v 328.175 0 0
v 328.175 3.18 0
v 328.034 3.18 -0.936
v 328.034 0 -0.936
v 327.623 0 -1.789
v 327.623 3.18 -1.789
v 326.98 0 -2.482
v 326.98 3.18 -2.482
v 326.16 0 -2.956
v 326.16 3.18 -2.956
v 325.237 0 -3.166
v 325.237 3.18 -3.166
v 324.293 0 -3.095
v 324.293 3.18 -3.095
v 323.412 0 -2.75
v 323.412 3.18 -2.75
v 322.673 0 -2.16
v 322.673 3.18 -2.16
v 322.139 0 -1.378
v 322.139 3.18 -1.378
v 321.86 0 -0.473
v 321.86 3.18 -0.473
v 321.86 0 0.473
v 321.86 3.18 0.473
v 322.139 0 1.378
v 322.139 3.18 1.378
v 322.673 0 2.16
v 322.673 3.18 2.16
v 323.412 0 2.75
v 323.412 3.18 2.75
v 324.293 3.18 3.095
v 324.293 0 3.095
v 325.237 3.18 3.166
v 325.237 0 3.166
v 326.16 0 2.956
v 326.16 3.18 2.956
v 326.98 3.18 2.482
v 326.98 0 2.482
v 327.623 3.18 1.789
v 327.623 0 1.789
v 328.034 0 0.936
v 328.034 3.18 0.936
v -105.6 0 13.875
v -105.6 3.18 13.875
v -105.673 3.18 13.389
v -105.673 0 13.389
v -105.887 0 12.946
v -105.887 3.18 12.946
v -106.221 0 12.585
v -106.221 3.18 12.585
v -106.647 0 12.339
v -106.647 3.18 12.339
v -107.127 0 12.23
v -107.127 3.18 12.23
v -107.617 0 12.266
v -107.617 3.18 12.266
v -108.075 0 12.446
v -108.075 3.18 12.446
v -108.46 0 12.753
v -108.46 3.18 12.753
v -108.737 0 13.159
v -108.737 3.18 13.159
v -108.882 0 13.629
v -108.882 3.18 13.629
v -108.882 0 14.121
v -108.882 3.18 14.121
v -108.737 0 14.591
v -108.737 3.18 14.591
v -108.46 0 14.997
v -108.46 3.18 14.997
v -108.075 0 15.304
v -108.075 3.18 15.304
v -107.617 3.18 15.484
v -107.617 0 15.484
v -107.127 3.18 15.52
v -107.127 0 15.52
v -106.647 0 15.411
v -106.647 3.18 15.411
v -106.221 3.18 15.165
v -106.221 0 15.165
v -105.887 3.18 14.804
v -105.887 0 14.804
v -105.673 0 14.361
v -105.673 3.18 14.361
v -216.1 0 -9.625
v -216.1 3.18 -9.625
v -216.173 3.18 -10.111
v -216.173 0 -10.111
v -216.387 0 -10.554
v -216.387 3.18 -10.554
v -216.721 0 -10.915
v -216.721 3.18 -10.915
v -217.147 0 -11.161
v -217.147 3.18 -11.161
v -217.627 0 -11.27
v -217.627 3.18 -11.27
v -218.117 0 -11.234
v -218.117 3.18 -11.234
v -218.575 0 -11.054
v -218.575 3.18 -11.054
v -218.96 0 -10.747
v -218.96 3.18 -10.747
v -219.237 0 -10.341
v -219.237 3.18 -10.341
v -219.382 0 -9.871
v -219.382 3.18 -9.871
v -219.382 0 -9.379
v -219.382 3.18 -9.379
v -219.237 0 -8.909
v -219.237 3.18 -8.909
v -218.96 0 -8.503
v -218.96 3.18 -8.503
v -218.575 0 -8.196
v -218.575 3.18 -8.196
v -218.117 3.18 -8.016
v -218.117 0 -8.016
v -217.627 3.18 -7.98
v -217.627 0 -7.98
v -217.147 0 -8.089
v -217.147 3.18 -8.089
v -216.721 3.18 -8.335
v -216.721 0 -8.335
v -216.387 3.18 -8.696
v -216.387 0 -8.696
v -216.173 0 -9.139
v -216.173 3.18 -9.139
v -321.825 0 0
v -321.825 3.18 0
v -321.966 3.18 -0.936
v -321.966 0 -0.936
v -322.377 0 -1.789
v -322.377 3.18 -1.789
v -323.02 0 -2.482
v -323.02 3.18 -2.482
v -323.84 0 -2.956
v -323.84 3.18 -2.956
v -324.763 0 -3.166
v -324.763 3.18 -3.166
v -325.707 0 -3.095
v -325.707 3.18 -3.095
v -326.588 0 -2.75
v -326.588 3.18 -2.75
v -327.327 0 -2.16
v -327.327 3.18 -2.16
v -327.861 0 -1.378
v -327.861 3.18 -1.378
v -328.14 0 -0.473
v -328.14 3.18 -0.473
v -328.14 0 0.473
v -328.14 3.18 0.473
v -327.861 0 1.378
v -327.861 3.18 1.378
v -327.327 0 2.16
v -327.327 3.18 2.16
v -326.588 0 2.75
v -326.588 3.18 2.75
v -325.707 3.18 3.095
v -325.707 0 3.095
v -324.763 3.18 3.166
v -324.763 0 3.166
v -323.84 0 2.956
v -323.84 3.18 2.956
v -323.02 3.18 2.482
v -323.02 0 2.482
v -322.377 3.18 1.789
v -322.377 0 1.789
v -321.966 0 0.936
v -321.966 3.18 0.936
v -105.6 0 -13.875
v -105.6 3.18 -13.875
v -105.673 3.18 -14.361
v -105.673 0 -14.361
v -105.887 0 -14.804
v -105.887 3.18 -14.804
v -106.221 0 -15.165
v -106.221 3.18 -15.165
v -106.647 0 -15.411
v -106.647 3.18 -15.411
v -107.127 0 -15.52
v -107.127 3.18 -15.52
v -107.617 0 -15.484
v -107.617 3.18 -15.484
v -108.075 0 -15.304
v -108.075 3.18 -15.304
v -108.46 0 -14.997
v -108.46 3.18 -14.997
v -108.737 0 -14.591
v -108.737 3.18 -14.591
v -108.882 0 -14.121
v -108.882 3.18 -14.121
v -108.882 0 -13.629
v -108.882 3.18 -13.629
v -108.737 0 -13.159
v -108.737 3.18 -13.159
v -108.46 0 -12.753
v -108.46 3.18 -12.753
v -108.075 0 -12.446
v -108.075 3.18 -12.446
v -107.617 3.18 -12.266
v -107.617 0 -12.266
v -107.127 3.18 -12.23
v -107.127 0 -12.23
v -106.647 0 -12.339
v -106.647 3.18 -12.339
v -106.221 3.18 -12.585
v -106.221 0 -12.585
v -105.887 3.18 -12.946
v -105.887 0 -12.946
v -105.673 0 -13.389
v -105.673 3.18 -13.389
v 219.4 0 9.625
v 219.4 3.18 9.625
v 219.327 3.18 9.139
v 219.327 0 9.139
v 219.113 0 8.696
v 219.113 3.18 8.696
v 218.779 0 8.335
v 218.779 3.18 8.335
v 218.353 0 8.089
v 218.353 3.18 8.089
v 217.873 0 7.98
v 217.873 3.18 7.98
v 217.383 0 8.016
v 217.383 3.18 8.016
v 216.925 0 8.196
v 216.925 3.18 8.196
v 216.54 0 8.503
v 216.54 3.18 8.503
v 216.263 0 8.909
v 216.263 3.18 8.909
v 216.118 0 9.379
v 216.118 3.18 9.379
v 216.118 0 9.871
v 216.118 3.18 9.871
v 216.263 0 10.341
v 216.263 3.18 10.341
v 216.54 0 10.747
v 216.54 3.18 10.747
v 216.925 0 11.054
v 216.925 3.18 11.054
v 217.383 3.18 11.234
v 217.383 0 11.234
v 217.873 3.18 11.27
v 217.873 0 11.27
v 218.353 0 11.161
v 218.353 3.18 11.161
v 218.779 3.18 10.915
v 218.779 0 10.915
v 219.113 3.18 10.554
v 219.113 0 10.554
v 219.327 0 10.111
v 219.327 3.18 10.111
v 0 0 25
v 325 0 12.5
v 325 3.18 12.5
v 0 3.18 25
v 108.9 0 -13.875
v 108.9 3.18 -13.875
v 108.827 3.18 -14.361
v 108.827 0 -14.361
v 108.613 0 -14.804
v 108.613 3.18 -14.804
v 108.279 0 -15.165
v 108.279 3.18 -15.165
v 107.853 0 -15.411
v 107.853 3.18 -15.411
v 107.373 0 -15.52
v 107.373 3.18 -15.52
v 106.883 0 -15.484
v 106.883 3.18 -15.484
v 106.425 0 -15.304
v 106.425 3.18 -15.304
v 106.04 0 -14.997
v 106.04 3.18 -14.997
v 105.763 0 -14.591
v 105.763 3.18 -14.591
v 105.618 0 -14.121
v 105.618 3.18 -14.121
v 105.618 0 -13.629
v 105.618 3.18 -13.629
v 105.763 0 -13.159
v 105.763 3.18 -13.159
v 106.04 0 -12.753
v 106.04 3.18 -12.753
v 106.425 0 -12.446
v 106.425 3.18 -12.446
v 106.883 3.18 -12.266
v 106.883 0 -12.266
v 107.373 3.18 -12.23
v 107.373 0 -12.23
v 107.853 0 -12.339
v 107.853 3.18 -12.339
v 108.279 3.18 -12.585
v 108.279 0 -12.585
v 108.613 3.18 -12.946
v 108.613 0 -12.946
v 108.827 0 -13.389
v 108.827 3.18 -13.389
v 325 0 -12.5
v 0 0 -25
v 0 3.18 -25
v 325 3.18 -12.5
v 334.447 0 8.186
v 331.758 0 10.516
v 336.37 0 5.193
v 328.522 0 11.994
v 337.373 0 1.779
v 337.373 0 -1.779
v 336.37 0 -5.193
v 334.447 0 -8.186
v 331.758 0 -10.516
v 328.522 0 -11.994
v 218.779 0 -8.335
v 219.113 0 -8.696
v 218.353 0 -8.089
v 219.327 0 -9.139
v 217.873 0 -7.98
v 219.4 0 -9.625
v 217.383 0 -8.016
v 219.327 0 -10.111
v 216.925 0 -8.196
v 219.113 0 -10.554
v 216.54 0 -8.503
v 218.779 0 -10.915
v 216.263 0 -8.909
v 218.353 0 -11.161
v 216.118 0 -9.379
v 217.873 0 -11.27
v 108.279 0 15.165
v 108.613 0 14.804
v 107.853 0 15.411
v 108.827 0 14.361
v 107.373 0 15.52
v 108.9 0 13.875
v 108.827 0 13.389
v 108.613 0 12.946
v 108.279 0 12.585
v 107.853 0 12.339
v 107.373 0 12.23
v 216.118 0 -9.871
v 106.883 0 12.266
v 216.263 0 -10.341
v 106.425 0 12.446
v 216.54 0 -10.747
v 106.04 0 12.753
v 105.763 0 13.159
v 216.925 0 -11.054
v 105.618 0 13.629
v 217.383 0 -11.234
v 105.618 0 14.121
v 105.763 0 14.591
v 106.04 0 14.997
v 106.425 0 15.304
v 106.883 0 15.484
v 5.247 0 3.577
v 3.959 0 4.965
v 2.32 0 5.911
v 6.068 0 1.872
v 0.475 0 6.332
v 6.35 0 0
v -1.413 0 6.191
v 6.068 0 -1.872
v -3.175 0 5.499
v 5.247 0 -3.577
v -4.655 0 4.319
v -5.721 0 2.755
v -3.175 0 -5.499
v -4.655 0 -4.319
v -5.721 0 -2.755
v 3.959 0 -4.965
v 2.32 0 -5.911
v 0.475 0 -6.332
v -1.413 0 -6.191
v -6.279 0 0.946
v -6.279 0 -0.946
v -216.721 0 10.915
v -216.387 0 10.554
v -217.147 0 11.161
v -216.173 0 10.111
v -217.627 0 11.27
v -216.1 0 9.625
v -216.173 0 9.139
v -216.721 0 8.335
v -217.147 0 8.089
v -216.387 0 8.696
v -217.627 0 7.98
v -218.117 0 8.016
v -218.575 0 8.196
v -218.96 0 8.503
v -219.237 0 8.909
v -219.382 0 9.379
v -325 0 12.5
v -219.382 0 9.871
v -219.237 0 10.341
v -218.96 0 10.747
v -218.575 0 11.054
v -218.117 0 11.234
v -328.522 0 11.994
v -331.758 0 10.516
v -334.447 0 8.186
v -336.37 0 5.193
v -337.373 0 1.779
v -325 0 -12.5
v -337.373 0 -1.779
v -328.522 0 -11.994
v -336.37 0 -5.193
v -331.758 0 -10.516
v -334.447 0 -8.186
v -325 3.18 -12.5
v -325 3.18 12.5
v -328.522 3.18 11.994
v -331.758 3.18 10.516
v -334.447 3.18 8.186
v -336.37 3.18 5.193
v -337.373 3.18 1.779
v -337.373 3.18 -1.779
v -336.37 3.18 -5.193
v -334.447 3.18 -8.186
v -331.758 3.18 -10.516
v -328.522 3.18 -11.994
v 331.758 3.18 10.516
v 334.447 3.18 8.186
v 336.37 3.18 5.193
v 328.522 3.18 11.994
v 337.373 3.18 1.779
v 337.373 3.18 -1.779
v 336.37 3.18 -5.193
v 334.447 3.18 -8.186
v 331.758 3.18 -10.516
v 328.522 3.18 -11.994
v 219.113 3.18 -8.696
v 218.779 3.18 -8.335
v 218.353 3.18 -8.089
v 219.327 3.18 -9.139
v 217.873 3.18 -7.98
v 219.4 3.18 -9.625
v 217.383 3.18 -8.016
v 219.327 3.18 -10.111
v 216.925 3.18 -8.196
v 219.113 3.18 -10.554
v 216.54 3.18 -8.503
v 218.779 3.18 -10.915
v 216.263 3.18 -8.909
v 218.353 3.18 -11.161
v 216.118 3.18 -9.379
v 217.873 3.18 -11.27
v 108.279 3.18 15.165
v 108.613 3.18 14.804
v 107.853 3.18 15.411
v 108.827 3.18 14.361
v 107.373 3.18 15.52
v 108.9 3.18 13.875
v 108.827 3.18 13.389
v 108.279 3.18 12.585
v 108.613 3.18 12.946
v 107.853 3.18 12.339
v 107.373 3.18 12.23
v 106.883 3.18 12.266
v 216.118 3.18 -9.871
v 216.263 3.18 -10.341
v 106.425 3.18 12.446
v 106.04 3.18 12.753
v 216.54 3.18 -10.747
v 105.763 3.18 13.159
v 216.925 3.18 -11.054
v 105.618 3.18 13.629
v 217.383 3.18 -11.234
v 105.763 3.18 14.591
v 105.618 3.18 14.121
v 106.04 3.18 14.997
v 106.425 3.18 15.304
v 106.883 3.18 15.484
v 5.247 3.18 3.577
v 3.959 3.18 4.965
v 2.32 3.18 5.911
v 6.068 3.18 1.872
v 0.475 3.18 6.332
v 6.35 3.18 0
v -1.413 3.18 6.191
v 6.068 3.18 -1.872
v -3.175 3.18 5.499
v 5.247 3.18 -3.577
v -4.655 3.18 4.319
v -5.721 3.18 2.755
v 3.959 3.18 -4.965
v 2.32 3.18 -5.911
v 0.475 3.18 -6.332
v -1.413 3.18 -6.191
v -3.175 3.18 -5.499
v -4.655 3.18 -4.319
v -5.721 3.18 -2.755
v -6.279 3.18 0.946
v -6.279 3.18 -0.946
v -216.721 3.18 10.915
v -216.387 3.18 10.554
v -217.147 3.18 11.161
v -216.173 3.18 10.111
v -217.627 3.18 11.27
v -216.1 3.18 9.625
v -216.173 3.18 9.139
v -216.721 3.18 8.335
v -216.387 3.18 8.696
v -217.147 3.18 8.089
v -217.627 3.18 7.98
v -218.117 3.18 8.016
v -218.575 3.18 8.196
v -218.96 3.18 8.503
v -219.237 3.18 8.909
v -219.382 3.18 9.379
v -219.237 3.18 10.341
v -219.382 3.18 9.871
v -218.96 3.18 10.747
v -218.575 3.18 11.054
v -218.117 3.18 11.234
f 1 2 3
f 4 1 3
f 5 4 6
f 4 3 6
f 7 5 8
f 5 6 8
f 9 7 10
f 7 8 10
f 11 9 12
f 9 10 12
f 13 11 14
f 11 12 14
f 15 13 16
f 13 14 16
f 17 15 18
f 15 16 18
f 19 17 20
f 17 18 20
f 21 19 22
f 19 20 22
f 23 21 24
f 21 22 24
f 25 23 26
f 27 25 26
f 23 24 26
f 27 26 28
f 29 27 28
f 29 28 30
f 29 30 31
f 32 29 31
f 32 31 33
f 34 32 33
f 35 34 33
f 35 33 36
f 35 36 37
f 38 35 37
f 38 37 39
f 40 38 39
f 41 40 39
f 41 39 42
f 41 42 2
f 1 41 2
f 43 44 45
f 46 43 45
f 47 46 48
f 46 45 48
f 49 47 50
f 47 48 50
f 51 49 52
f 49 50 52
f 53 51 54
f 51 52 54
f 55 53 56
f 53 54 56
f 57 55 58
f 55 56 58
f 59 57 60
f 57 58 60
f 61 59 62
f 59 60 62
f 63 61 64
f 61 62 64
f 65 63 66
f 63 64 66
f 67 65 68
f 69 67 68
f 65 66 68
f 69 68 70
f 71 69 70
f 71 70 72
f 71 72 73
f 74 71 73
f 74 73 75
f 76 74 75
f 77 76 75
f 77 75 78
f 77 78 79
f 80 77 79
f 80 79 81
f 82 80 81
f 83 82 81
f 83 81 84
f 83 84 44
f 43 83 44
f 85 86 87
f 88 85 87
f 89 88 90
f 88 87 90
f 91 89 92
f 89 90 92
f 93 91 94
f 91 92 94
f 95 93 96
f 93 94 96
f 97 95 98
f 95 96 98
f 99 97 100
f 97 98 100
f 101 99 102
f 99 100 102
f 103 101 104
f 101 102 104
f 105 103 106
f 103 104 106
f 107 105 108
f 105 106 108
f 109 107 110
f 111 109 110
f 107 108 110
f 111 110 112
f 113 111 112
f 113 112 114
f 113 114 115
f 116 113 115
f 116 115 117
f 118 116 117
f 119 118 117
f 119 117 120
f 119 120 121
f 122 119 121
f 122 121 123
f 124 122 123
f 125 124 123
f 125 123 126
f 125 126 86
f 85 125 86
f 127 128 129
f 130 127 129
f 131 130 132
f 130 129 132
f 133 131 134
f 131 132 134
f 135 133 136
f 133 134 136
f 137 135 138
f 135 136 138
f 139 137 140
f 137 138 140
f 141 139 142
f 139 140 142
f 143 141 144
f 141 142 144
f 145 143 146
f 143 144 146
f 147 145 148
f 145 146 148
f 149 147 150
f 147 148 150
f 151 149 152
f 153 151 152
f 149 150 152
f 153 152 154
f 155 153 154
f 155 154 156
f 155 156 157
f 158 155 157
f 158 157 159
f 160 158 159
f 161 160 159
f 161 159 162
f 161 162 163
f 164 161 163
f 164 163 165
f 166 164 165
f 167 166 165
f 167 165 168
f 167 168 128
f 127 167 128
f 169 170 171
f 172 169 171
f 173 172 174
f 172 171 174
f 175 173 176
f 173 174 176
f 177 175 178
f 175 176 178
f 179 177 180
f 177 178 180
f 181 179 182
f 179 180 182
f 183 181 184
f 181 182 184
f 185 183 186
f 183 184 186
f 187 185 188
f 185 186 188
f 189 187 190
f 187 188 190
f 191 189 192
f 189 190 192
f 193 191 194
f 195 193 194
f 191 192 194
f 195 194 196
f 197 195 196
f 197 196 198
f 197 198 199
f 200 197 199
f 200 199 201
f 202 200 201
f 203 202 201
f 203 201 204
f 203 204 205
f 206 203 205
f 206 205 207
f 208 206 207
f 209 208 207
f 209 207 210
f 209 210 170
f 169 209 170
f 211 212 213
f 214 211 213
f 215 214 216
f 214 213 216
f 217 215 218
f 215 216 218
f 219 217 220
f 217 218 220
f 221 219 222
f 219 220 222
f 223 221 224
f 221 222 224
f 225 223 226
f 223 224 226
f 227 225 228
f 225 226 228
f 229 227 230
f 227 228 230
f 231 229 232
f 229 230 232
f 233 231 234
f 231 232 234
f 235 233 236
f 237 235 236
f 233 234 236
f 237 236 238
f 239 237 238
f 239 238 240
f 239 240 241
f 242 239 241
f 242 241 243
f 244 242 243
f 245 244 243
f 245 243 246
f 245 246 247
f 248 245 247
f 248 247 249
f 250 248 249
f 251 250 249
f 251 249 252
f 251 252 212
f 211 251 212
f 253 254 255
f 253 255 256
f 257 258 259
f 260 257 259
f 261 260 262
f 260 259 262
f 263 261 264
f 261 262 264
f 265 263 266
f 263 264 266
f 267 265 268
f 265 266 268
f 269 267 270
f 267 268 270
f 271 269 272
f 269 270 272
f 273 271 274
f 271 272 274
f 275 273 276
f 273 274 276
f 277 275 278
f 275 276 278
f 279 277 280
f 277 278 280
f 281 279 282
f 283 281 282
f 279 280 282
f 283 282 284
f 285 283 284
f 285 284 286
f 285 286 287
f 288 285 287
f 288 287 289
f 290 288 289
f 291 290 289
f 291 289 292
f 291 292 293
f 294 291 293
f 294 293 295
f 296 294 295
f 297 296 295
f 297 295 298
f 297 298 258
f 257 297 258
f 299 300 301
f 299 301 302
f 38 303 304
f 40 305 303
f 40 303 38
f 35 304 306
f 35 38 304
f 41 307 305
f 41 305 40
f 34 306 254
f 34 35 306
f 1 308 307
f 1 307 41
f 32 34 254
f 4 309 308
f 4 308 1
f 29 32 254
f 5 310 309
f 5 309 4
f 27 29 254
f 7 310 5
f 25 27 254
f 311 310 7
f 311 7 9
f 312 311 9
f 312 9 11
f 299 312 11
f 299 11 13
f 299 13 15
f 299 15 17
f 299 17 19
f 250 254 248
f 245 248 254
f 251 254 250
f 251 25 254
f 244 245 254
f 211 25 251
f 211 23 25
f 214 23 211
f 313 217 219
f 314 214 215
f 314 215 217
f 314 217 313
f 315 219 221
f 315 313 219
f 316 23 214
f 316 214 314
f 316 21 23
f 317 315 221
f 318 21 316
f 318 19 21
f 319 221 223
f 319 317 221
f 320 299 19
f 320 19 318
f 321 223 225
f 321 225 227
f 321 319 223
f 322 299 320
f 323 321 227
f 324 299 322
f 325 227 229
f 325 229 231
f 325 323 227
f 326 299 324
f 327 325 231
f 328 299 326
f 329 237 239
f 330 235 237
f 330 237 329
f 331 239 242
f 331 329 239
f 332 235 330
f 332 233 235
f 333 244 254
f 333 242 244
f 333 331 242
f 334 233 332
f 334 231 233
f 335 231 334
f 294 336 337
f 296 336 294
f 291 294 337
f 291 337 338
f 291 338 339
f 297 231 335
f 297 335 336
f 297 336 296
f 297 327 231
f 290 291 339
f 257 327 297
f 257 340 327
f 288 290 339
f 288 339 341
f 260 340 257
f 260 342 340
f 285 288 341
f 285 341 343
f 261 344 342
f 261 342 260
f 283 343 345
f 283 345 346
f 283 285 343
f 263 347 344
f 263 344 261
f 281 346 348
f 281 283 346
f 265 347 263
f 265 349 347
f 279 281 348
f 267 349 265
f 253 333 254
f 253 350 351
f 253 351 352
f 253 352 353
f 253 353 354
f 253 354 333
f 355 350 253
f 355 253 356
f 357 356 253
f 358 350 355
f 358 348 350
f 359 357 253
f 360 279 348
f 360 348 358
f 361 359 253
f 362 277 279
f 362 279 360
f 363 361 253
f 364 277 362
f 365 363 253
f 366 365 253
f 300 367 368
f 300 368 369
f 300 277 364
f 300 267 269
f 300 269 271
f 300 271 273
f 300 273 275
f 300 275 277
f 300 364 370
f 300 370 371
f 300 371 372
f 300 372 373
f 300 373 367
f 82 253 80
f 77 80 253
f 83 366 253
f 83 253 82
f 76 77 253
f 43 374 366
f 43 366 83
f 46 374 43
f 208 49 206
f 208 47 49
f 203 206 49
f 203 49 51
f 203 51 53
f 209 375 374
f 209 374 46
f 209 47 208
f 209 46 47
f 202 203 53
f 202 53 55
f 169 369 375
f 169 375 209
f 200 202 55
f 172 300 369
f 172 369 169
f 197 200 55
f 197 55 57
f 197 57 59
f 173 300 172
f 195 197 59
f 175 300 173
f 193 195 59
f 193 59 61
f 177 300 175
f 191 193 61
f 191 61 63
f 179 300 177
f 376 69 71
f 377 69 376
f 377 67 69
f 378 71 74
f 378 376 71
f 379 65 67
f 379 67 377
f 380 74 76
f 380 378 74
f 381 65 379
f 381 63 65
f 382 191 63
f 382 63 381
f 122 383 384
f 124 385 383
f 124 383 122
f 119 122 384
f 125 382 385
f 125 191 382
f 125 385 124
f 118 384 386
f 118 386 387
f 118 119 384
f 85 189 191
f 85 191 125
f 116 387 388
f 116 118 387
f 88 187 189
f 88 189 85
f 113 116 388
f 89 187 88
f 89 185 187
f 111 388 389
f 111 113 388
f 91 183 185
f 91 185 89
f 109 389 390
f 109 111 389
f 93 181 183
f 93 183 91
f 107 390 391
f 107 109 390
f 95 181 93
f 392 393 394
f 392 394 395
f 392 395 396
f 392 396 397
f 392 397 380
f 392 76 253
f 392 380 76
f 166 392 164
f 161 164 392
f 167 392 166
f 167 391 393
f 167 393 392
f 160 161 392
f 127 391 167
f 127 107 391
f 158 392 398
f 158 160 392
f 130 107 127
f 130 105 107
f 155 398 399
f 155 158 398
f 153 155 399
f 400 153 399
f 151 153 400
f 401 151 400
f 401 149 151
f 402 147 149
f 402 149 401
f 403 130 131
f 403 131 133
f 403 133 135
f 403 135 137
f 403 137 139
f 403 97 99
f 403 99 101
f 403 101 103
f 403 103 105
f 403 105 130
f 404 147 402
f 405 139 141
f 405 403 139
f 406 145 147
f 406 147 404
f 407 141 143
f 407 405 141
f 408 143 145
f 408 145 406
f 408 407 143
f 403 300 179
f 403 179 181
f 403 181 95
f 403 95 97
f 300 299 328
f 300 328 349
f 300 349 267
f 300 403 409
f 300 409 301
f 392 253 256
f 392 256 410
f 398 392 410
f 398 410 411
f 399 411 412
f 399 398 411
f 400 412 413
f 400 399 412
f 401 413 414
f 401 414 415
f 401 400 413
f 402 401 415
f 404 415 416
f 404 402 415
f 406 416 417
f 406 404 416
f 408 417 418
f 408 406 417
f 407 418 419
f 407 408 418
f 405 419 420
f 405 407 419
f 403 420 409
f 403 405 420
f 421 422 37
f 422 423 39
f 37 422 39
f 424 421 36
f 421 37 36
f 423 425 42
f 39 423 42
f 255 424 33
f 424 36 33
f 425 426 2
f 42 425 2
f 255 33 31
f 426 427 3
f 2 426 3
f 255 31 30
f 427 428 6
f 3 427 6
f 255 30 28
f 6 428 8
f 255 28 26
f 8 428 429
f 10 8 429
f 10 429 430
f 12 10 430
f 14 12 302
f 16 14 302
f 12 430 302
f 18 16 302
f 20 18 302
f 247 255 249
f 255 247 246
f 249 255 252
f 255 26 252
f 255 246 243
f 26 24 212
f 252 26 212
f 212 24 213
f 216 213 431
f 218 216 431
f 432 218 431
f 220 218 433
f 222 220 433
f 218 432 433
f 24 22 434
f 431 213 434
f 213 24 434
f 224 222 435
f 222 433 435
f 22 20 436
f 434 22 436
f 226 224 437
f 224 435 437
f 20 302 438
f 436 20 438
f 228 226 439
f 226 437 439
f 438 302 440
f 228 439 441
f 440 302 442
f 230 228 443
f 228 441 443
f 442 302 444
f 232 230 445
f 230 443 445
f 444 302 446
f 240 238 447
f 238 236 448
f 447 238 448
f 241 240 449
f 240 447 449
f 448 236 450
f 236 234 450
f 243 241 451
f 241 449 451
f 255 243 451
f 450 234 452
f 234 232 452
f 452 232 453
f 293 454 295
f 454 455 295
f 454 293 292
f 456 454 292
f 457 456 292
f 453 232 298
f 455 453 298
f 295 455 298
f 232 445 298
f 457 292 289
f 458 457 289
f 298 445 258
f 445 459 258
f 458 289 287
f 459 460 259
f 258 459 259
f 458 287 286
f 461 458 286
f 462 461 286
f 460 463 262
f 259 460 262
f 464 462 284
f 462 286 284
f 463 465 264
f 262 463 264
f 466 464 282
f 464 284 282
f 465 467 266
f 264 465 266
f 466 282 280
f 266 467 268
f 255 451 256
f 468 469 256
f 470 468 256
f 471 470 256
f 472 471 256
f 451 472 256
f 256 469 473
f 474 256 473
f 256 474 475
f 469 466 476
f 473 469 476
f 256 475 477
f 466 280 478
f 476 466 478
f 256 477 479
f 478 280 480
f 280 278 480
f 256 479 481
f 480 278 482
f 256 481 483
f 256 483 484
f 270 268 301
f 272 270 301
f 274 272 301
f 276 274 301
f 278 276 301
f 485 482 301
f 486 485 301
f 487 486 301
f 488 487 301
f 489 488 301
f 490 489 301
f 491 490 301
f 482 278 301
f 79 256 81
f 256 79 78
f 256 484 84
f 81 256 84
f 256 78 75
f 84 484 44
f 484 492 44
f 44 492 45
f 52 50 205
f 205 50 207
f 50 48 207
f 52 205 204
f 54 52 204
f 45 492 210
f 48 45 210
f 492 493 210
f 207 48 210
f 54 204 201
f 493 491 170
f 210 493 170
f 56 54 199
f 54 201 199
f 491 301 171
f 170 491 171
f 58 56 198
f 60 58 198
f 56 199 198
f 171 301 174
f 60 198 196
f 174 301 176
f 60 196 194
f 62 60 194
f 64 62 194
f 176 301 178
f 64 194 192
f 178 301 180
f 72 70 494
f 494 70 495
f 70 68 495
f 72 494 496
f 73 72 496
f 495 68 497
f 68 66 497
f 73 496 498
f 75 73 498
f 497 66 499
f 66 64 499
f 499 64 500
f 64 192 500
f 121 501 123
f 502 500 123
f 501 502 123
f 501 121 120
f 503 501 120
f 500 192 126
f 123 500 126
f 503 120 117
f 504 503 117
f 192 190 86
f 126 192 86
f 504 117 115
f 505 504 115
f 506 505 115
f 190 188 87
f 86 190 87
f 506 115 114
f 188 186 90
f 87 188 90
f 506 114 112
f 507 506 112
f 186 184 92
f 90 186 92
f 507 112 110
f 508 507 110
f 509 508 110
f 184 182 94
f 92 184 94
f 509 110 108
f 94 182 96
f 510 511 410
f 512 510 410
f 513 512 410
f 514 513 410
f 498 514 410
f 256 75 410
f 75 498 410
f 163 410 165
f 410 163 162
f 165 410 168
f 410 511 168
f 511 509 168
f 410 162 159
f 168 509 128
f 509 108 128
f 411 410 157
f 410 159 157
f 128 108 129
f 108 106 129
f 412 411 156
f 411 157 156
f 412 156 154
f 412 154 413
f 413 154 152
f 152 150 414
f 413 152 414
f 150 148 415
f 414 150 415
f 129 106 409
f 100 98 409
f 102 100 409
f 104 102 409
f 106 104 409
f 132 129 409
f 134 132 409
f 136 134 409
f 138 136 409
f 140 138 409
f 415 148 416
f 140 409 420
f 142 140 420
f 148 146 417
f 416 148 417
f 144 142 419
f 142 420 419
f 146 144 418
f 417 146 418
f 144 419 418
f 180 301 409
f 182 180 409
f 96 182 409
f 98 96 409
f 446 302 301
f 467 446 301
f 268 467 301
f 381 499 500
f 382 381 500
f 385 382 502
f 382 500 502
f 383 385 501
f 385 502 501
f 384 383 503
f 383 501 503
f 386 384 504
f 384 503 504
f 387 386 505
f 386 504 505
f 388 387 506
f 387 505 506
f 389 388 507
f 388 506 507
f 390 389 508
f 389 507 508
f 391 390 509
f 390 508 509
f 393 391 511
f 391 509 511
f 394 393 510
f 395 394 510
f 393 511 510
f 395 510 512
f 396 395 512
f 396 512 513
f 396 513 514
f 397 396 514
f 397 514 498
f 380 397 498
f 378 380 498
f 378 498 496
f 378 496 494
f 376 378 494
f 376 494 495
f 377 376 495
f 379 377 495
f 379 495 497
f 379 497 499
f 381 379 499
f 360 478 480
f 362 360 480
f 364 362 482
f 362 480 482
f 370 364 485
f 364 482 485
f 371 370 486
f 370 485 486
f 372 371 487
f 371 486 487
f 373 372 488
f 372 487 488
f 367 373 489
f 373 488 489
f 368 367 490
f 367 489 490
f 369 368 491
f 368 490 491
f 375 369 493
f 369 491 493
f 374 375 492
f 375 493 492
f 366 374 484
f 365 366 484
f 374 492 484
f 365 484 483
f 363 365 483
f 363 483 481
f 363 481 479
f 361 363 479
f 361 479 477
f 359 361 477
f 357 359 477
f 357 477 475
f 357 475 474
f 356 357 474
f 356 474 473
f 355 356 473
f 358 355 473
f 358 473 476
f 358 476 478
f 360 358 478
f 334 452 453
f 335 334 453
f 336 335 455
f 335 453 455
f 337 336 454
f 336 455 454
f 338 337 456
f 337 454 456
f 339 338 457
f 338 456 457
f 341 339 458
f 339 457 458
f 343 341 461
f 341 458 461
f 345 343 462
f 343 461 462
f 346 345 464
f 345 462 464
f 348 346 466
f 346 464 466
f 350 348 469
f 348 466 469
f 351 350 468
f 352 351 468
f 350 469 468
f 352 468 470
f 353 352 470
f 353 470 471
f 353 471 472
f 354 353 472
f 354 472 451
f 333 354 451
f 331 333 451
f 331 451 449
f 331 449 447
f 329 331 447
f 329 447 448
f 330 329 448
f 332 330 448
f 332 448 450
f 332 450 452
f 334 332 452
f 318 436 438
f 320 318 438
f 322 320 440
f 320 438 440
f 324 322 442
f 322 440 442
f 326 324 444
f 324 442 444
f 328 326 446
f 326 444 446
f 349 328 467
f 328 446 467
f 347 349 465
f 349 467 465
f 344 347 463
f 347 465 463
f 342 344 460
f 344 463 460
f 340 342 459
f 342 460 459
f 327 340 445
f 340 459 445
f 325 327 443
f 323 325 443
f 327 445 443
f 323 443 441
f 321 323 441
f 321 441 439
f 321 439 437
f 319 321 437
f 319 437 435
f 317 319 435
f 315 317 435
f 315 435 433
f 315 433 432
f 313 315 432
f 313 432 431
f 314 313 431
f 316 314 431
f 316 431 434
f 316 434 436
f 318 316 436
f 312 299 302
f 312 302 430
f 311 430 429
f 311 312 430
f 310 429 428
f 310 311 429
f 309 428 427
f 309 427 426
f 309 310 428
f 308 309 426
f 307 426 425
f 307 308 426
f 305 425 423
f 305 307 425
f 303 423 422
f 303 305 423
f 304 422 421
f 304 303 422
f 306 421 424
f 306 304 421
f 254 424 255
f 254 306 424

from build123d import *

# Parameters (mm, degrees)
BOSS_EXTRUDE1_DEPTH = 3.18
SKETCH3_R           = 6.35
SKETCH3_R_2         = 3.175
SKETCH3_R_3         = 1.65
CUT_EXTRUDE1_DEPTH  = 4.18


with BuildPart() as part:
    # Sketch2 → Boss-Extrude1 (new body)
    with BuildSketch(Plane(origin=(0, 0, 0), x_dir=(1, 0, 0), z_dir=(0, 1, 0))):
        with BuildLine():
            Line((-325, 12.5), (0, 25))
            Line((0, 25), (325, 12.5))
            ThreePointArc((325, 12.5), (337.5, 0), (325, -12.5))
            Line((325, -12.5), (0, -25))
            Line((0, -25), (-325, -12.5))
            ThreePointArc((-325, -12.5), (-337.5, 0), (-325, 12.5))
        make_face()
    extrude(amount=BOSS_EXTRUDE1_DEPTH)

    # Sketch3 → Cut-Extrude1 (cut, through all)
    with BuildSketch(Plane(origin=(0, 3.18, 0), x_dir=(1, 0, 0), z_dir=(0, 1, 0))):
        Circle(SKETCH3_R)
        with Locations((-325, 0)):
            Circle(SKETCH3_R_2)
        with Locations((-217.75, 9.625)):
            Circle(SKETCH3_R_3)
        with Locations((-107.25, -13.875)):
            Circle(SKETCH3_R_3)
        with Locations((325, 0)):
            Circle(SKETCH3_R_2)
        with Locations((-107.25, 13.875)):
            Circle(SKETCH3_R_3)
        with Locations((-217.75, -9.625)):
            Circle(SKETCH3_R_3)
        with Locations((107.25, -13.875)):
            Circle(SKETCH3_R_3)
        with Locations((107.25, 13.875)):
            Circle(SKETCH3_R_3)
        with Locations((217.75, -9.625)):
            Circle(SKETCH3_R_3)
        with Locations((217.75, 9.625)):
            Circle(SKETCH3_R_3)
    extrude(amount=-CUT_EXTRUDE1_DEPTH, mode=Mode.SUBTRACT)


solid = part.part
